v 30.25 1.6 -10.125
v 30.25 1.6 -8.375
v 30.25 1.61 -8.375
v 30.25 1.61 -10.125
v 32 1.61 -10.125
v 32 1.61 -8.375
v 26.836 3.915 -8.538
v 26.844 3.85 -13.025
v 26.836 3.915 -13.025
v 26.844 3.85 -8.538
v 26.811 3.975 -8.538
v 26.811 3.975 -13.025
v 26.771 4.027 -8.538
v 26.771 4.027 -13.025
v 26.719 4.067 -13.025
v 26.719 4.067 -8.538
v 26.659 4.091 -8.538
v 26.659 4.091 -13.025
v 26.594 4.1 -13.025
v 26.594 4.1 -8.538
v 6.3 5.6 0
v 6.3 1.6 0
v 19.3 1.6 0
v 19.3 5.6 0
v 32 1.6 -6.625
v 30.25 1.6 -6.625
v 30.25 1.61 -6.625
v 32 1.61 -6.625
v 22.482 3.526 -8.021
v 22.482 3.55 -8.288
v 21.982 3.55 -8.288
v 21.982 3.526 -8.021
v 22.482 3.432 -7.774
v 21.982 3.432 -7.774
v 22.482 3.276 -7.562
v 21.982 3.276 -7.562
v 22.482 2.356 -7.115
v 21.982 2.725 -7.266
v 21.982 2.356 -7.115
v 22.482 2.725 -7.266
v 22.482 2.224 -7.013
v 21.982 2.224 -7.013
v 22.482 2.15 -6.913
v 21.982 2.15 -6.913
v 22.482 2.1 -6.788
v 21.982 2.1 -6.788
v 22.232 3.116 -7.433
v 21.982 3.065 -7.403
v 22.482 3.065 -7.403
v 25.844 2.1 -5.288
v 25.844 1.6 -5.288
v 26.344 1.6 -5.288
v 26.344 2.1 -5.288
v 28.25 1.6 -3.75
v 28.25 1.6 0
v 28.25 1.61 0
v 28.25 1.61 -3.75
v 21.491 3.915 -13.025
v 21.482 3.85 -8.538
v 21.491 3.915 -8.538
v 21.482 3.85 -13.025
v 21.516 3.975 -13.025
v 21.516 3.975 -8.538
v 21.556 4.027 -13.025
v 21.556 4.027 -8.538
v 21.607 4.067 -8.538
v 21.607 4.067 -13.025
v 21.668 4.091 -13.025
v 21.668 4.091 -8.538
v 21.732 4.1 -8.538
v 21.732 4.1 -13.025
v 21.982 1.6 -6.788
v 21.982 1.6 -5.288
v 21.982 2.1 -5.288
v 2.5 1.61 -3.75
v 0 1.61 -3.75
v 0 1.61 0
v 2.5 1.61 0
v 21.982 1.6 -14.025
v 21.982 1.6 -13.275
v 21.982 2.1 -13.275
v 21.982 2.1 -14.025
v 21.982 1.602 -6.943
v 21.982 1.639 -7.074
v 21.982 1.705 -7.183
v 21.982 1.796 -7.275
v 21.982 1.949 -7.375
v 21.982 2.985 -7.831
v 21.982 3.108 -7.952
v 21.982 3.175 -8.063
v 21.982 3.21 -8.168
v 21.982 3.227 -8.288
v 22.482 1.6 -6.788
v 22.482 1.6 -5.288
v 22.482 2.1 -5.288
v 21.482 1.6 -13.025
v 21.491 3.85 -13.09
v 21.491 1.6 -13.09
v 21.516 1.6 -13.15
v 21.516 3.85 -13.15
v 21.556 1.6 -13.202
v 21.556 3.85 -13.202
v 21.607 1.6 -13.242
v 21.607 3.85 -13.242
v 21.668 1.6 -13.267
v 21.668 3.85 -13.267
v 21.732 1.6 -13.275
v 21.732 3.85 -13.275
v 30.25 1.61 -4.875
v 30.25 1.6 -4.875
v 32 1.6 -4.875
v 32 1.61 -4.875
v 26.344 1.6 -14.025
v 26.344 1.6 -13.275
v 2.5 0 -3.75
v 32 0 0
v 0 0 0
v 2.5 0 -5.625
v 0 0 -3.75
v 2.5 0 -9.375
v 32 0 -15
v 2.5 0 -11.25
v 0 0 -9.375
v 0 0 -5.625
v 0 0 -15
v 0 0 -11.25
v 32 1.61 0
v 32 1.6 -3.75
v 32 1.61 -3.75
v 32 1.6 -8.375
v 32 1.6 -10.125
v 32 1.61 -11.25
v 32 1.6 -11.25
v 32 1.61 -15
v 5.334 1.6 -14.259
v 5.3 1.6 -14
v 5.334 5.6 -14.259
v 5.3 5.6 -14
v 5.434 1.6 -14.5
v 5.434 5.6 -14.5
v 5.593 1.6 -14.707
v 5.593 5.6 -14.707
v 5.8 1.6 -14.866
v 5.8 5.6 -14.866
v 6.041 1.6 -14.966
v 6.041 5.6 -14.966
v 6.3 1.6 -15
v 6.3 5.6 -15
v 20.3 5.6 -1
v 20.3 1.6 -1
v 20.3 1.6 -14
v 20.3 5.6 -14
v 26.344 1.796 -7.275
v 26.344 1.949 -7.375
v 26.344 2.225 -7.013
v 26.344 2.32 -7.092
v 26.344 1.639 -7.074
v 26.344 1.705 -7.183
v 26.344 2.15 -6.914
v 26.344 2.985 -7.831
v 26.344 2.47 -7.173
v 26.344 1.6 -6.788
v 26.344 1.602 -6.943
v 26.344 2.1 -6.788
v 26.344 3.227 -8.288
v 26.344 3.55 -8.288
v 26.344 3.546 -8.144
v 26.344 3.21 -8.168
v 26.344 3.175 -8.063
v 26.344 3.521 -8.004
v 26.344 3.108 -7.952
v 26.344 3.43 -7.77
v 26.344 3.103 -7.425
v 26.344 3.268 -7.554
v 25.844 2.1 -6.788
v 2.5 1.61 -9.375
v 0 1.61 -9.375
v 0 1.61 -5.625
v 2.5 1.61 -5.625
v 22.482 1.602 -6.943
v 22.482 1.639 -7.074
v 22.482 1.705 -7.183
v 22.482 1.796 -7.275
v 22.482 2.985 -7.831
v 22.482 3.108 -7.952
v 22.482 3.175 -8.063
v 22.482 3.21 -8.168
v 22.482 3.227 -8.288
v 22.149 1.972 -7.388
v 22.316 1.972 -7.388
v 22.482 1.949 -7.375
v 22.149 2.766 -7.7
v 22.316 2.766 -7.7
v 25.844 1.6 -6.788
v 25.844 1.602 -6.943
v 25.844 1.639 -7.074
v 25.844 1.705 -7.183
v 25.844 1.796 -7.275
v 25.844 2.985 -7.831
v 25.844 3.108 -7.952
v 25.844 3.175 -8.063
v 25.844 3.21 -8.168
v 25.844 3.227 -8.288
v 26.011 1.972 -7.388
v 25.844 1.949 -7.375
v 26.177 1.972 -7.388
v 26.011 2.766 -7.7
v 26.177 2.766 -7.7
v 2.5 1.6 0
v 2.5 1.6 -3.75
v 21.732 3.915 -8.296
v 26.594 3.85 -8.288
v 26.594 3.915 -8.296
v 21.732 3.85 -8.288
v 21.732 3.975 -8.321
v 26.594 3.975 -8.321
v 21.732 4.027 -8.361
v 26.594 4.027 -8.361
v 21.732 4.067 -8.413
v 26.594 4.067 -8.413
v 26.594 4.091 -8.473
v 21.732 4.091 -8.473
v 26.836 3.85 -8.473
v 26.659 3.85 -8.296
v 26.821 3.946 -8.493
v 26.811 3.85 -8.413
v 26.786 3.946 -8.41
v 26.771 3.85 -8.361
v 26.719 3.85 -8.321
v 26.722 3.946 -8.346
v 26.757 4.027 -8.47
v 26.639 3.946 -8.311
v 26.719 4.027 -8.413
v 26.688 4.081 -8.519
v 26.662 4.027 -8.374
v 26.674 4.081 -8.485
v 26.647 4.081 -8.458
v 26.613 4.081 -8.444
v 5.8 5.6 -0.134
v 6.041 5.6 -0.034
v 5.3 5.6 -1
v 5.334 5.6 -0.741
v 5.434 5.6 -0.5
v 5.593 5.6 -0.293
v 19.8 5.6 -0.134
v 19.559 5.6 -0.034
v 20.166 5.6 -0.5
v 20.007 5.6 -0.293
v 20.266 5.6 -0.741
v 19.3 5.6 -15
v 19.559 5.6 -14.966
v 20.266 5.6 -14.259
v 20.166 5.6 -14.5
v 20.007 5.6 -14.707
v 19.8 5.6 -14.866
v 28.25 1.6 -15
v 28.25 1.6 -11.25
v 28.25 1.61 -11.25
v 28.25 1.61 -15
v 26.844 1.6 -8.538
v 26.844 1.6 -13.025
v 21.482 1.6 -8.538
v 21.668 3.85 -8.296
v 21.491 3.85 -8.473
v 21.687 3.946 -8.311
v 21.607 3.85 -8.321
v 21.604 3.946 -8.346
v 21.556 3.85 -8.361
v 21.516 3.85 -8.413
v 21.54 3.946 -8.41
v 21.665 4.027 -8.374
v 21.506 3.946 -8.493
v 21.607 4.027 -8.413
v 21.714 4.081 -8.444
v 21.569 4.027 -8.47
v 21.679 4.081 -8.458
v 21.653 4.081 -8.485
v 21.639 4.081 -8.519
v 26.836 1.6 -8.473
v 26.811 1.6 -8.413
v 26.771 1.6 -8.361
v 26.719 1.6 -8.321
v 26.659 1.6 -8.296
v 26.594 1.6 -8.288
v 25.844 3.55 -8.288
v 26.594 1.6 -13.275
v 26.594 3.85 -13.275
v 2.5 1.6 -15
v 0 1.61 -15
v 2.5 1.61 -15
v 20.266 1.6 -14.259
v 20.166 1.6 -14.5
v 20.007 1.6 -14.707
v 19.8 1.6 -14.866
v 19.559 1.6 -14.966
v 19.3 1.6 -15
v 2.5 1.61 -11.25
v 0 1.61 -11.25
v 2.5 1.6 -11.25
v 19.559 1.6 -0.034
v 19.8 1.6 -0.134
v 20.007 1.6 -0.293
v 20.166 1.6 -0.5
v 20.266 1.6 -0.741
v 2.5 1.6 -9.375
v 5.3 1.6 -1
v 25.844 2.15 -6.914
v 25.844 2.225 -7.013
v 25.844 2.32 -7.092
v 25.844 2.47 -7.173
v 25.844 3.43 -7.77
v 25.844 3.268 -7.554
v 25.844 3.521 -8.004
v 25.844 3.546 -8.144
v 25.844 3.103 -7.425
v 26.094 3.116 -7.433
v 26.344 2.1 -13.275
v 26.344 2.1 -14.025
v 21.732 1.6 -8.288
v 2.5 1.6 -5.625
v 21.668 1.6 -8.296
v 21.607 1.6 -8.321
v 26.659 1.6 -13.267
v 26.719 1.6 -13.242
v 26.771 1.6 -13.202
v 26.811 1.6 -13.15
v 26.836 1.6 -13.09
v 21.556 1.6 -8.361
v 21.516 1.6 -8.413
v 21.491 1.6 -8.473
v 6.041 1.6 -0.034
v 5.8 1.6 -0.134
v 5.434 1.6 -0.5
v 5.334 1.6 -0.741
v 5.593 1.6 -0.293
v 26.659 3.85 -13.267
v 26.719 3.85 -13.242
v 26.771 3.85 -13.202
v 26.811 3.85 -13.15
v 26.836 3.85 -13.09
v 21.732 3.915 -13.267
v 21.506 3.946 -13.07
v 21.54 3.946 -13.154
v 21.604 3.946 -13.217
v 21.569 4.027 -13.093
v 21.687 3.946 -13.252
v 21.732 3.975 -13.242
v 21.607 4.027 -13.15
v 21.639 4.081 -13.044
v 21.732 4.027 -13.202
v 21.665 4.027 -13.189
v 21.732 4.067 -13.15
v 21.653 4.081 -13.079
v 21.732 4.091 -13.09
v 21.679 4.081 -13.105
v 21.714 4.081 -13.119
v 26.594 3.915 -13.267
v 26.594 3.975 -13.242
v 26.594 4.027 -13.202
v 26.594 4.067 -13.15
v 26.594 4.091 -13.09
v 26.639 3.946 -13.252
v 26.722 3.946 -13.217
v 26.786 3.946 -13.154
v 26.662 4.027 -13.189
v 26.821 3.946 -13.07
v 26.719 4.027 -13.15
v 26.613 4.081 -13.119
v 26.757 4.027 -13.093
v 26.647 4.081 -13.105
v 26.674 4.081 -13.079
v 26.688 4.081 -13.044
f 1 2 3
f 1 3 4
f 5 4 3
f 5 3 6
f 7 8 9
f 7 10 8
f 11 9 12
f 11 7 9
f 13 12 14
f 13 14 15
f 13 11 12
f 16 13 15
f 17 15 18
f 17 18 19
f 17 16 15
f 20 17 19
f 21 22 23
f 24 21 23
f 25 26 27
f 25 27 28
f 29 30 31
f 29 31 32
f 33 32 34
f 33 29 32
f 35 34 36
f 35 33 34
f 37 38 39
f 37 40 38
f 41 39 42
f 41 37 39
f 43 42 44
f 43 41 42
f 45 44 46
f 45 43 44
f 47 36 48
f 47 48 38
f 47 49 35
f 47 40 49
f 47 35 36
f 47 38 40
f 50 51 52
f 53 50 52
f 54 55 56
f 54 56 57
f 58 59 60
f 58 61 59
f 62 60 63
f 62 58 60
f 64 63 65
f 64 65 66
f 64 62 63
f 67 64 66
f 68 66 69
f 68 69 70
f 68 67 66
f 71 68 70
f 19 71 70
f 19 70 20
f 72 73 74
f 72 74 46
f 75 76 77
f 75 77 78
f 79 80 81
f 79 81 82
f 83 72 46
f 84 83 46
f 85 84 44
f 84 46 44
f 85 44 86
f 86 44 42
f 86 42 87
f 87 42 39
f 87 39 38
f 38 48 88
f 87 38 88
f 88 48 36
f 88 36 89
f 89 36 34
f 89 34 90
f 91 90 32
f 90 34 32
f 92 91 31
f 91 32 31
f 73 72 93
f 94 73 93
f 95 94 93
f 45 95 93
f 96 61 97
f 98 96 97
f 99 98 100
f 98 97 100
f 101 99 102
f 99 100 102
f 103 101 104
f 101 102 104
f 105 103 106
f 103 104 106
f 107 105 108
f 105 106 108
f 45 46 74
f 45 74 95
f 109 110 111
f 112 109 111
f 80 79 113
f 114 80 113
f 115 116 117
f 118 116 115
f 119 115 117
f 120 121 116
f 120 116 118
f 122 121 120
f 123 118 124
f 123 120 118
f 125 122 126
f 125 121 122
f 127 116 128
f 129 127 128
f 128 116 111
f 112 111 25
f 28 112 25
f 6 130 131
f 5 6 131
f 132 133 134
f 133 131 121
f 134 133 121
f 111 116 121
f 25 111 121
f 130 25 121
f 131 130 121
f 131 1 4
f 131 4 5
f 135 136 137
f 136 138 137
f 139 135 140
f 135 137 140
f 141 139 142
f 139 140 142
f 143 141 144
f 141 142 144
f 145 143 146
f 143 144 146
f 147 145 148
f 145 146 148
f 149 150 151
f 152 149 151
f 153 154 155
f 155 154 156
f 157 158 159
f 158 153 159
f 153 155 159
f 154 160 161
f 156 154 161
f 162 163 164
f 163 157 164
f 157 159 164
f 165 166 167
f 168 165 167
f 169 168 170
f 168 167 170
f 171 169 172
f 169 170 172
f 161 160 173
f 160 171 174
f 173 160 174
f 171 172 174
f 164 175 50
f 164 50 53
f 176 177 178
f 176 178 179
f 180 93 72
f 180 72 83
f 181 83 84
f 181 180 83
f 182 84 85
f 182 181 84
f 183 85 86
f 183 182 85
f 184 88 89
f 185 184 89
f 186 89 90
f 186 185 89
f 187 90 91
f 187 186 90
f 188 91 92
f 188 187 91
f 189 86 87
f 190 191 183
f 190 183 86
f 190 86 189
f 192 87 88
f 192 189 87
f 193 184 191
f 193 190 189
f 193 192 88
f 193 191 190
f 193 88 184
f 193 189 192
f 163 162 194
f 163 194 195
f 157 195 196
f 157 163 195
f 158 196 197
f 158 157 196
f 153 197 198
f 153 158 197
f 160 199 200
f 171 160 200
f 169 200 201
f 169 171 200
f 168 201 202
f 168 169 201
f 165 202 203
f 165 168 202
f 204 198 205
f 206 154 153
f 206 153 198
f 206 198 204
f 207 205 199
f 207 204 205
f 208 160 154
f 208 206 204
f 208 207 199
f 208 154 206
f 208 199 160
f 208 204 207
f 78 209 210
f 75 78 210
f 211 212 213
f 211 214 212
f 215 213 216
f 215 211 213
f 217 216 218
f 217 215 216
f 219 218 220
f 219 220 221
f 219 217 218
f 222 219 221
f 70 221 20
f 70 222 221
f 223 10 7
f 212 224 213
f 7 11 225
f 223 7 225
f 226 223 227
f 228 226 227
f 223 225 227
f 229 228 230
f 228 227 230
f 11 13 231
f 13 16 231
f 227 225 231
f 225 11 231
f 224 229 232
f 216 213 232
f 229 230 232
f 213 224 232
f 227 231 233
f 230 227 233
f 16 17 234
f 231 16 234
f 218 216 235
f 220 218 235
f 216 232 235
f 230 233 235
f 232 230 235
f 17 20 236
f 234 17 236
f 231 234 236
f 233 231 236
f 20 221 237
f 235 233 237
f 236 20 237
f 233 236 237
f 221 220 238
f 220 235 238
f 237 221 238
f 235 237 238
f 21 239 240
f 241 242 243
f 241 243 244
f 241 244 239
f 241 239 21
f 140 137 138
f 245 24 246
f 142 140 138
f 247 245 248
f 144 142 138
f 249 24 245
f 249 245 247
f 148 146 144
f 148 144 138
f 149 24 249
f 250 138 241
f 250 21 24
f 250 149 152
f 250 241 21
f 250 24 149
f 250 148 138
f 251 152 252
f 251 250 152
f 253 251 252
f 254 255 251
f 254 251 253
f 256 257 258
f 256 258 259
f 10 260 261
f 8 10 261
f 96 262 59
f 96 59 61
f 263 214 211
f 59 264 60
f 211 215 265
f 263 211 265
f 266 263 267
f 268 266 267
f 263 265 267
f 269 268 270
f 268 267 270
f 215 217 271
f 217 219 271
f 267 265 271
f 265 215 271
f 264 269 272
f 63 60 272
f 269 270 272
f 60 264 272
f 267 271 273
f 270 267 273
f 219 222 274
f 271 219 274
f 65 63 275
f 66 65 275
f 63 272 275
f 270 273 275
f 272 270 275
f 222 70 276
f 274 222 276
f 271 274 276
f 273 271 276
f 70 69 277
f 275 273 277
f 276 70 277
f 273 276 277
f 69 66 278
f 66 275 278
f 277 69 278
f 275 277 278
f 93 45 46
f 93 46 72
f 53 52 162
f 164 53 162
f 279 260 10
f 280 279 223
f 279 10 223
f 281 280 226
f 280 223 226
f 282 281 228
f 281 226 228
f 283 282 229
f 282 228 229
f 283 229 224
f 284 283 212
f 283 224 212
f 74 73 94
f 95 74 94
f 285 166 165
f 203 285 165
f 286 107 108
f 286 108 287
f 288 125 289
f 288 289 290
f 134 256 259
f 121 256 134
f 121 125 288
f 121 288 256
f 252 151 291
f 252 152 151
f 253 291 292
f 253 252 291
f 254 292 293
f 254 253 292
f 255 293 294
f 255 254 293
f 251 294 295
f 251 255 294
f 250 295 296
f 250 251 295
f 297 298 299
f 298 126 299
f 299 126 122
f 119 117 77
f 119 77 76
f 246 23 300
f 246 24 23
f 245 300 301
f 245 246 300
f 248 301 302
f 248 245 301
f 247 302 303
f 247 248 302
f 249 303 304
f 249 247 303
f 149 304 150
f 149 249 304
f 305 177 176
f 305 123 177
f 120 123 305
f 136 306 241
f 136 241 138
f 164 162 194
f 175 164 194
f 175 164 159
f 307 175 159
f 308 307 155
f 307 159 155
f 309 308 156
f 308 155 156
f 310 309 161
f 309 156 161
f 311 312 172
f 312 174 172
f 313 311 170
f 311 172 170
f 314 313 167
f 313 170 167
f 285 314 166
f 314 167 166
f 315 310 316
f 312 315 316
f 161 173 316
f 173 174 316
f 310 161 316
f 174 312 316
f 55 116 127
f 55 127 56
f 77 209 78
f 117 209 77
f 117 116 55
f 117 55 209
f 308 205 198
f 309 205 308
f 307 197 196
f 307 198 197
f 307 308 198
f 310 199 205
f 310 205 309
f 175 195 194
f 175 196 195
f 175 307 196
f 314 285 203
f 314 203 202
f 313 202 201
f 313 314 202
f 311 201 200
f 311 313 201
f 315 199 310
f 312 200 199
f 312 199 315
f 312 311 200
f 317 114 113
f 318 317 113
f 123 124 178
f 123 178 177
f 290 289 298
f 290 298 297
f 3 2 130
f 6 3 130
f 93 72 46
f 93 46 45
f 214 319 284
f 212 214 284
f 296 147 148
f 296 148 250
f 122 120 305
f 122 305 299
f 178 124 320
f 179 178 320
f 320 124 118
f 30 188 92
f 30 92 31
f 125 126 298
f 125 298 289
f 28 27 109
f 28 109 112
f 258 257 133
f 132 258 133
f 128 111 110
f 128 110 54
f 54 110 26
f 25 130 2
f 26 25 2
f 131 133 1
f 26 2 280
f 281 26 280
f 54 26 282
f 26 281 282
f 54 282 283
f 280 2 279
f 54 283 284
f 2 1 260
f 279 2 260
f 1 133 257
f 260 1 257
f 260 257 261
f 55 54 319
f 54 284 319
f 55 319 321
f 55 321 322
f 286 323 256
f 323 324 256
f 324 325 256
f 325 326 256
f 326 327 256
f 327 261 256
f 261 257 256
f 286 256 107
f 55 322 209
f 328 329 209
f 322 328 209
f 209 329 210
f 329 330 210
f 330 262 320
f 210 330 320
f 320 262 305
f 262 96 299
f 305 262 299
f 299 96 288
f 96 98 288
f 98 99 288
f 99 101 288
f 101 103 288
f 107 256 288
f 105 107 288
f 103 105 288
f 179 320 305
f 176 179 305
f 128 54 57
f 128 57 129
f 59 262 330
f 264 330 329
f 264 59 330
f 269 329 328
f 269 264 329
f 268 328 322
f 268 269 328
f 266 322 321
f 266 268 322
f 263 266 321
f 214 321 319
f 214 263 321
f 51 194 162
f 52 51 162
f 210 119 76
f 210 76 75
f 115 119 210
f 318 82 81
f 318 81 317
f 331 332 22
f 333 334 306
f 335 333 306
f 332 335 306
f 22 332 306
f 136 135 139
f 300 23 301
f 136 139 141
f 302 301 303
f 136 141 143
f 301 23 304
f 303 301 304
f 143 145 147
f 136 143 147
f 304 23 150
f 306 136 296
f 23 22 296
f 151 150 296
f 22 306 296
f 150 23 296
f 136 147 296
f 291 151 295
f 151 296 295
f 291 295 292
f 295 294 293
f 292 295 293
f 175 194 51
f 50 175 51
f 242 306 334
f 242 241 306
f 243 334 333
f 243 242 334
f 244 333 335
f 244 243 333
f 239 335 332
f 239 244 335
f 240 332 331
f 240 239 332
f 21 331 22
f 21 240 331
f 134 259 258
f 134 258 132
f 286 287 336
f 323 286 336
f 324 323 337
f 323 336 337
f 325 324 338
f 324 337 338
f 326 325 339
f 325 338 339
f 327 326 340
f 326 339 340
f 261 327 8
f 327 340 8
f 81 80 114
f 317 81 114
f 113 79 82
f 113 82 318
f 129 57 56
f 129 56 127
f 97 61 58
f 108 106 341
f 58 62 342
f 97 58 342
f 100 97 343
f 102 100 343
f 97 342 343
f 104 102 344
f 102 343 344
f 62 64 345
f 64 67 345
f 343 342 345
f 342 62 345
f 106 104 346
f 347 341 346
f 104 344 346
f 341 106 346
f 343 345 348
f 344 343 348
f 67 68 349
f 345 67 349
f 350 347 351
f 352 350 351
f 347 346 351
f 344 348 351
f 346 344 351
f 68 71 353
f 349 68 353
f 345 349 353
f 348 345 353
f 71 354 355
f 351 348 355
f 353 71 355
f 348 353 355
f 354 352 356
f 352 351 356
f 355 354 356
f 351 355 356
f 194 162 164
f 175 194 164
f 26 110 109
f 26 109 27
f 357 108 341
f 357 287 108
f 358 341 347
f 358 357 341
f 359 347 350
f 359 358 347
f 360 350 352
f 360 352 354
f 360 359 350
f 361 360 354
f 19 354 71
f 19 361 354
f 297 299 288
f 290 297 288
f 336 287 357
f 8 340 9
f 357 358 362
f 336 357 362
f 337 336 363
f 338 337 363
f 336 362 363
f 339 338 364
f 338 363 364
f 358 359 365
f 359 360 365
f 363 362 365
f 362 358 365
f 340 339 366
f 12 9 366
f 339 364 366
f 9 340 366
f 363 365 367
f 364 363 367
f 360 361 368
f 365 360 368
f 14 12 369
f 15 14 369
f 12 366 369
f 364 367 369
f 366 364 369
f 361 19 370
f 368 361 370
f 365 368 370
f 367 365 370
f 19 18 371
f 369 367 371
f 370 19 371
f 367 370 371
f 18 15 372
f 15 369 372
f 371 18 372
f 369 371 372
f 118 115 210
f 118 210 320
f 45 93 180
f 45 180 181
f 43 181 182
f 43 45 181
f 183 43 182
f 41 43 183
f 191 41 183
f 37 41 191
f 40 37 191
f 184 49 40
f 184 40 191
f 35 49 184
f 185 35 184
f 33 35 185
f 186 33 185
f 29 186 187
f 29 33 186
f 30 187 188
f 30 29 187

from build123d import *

# Parameters (mm, degrees)
BOSS_EXTRUDE1_DEPTH   = 1.6
SKETCH2_W             = 15
SKETCH2_H             = 15
BOSS_EXTRUDE2_DEPTH   = 4
FILLET1_R             = 1
SKETCH3_W             = 3.75
SKETCH3_H             = 3.75
SKETCH3_W_2           = 1.75
SKETCH3_H_2           = 1.75
SKETCH3_W_3           = 2.5
BOSS_EXTRUDE3_DEPTH   = 0.01
SKETCH4_W             = 5.361600472
SKETCH4_H             = 4.987535322
BOSS_EXTRUDE4_DEPTH   = 2.5
BOSS_EXTRUDE5_DEPTH   = 0.5
SKETCH6_W             = 0.5
SKETCH6_H             = 1.5
BOSS_EXTRUDE5_2_DEPTH = 0.5
SKETCH6_W_2           = 4.361600472
SKETCH6_H_2           = 0.75
BOSS_EXTRUDE5_3_DEPTH = 0.5
BOSS_EXTRUDE6_DEPTH   = 0.5
BOSS_EXTRUDE7_DEPTH   = 0.5
FILLET2_R             = 0.25
FILLET3_R             = 0.25


with BuildPart() as part:
    # Sketch1 → Boss-Extrude1 (new body)
    with BuildSketch(Plane(origin=(0, 0, 0), x_dir=(1, 0, 0), z_dir=(0, 1, 0))):
        Polygon((2.5, 9.375), (2.5, 11.25), (0, 11.25), (0, 15), (32, 15), (32, 0), (0, 0), (0, 3.75), (2.5, 3.75), (2.5, 5.625), (0, 5.625), (0, 9.375), align=None)
    extrude(amount=BOSS_EXTRUDE1_DEPTH)

    # Sketch3 → Boss-Extrude3 (add)
    with BuildSketch(Plane(origin=(0, 1.6, 0), x_dir=(1, 0, 0), z_dir=(0, 1, 0))):
        with Locations((30.125, 13.125)):
            Rectangle(SKETCH3_W, SKETCH3_H)
        with Locations((31.125, 9.25)):
            Rectangle(SKETCH3_W_2, SKETCH3_H_2)
        with Locations((31.125, 5.75)):
            Rectangle(SKETCH3_W_2, SKETCH3_H_2)
        with Locations((30.125, 1.875)):
            Rectangle(SKETCH3_W, SKETCH3_H)
        with Locations((1.25, 13.125)):
            Rectangle(SKETCH3_W_3, SKETCH3_H)
        with Locations((1.25, 7.5)):
            Rectangle(SKETCH3_W_3, SKETCH3_H)
        with Locations((1.25, 1.875)):
            Rectangle(SKETCH3_W_3, SKETCH3_H)
    extrude(amount=BOSS_EXTRUDE3_DEPTH)

    # Sketch4 → Boss-Extrude4 (add)
    with BuildSketch(Plane(origin=(0, 1.6, 0), x_dir=(1, 0, 0), z_dir=(0, 1, 0))):
        with Locations((24.163228826, 10.781587961)):
            Rectangle(SKETCH4_W, SKETCH4_H)
    extrude(amount=BOSS_EXTRUDE4_DEPTH)

    # Fillet2
    fillet2_edges = [part.edges().sort_by_distance(p)[0] for p in [
        (21.48242859, 2.85, -8.2878203),
        (26.844029062, 2.85, -8.2878203),
        (26.844029062, 2.85, -13.275355622),
        (21.48242859, 2.85, -13.275355622),
    ]]
    fillet(fillet2_edges, radius=FILLET2_R)

    # Fillet3
    fillet3_edges = [part.edges().sort_by_distance(p)[0] for p in [
        (21.48242859, 4.1, -10.781587961),
        (24.163228826, 4.1, -13.275355622),
        (24.163228826, 4.1, -8.2878203),
        (26.844029062, 4.1, -10.781587961),
        (26.770805757, 4.1, -13.202132318),
        (26.770805757, 4.1, -8.361043604),
        (21.555651895, 4.1, -8.361043604),
        (21.555651895, 4.1, -13.202132318),
    ]]
    fillet(fillet3_edges, radius=FILLET3_R)


with BuildPart() as body_2:
    # Sketch2 → Boss-Extrude2 (new body)
    with BuildSketch(Plane(origin=(0, 1.6, 0), x_dir=(1, 0, 0), z_dir=(0, 1, 0))):
        with Locations((12.8, 7.5)):
            Rectangle(SKETCH2_W, SKETCH2_H)
    extrude(amount=BOSS_EXTRUDE2_DEPTH)

    # Fillet1
    fillet1_edges = [body_2.edges().sort_by_distance(p)[0] for p in [
        (5.3, 3.6, -15),
        (20.3, 3.6, -15),
        (20.3, 3.6, 0),
        (5.3, 3.6, 0),
    ]]
    fillet(fillet1_edges, radius=FILLET1_R)


with BuildPart() as body_3:
    # Sketch6 → Boss-Extrude5 (new body)
    with BuildSketch(Plane(origin=(0, 1.6, 0), x_dir=(1, 0, 0), z_dir=(0, 1, 0))):
        Polygon((26.344029062, 6.628226466), (26.344029062, 6.7878203), (25.844029062, 6.7878203), (25.844029062, 6.628226466), (25.844029062, 5.2878203), (26.344029062, 5.2878203), align=None)
    extrude(amount=BOSS_EXTRUDE5_DEPTH)


with BuildPart() as body_4:
    # Sketch6 → Boss-Extrude5 2 (new body)
    with BuildSketch(Plane(origin=(0, 1.6, 0), x_dir=(1, 0, 0), z_dir=(0, 1, 0))):
        with Locations((22.23242859, 6.0378203)):
            Rectangle(SKETCH6_W, SKETCH6_H)
    extrude(amount=BOSS_EXTRUDE5_2_DEPTH)


with BuildPart() as body_5:
    # Sketch6 → Boss-Extrude5 3 (new body)
    with BuildSketch(Plane(origin=(0, 1.6, 0), x_dir=(1, 0, 0), z_dir=(0, 1, 0))):
        with Locations((24.163228826, 13.650355622)):
            Rectangle(SKETCH6_W_2, SKETCH6_H_2)
    extrude(amount=BOSS_EXTRUDE5_3_DEPTH)


with BuildPart() as body_6:
    # Sketch7 → Boss-Extrude6 (new body)
    with BuildSketch(Plane(origin=(26.344029062, 0, 0), x_dir=(0, 0, -1), z_dir=(1, 0, 0))):
        with BuildLine():
            add(Edge.make_bspline(
                [(6.7878203, 2.1), (7.230171652, 2.215377346), (7.192285938, 3.194271107), (7.947516495, 3.566089293), (8.2878203, 3.549808919)],
                knots=[0, 0, 0, 0, 0.555688798, 1, 1, 1, 1], degree=3))
            Line((8.2878203, 3.549808919), (8.2878203, 3.226600806))
            add(Edge.make_bspline(
                [(6.7878203, 1.6), (7.7187684, 1.510074693), (7.374744979, 3.184552482), (8.2878203, 3.226600806)],
                knots=[0, 0, 0, 0, 1, 1, 1, 1], degree=3))
            Line((6.7878203, 1.6), (6.7878203, 2.1))
        make_face()
    extrude(amount=-BOSS_EXTRUDE6_DEPTH)


with BuildPart() as body_7:
    # Sketch8 → Boss-Extrude7 (new body)
    with BuildSketch(Plane(origin=(22.48242859, 0, 0), x_dir=(0, 0, -1), z_dir=(1, 0, 0))):
        with BuildLine():
            Line((6.7878203, 2.1), (6.7878203, 1.6))
            add(Edge.make_bspline(
                [(6.7878203, 1.6), (7.7187684, 1.510074693), (7.374744979, 3.184552482), (8.2878203, 3.226600806)],
                knots=[0, 0, 0, 0, 1, 1, 1, 1], degree=3))
            Line((8.2878203, 3.226600806), (8.2878203, 3.549808919))
            add(Edge.make_bspline(
                [(8.2878203, 3.549808919), (7.947516495, 3.566089293), (7.192285938, 3.194271107), (7.230171652, 2.215377346), (6.7878203, 2.1)],
                knots=[0, 0, 0, 0, 0.444311202, 1, 1, 1, 1], degree=3))
        make_face()
    extrude(amount=-BOSS_EXTRUDE7_DEPTH)


solid = Compound([part.part, body_2.part, body_3.part, body_4.part, body_5.part, body_6.part, body_7.part])
